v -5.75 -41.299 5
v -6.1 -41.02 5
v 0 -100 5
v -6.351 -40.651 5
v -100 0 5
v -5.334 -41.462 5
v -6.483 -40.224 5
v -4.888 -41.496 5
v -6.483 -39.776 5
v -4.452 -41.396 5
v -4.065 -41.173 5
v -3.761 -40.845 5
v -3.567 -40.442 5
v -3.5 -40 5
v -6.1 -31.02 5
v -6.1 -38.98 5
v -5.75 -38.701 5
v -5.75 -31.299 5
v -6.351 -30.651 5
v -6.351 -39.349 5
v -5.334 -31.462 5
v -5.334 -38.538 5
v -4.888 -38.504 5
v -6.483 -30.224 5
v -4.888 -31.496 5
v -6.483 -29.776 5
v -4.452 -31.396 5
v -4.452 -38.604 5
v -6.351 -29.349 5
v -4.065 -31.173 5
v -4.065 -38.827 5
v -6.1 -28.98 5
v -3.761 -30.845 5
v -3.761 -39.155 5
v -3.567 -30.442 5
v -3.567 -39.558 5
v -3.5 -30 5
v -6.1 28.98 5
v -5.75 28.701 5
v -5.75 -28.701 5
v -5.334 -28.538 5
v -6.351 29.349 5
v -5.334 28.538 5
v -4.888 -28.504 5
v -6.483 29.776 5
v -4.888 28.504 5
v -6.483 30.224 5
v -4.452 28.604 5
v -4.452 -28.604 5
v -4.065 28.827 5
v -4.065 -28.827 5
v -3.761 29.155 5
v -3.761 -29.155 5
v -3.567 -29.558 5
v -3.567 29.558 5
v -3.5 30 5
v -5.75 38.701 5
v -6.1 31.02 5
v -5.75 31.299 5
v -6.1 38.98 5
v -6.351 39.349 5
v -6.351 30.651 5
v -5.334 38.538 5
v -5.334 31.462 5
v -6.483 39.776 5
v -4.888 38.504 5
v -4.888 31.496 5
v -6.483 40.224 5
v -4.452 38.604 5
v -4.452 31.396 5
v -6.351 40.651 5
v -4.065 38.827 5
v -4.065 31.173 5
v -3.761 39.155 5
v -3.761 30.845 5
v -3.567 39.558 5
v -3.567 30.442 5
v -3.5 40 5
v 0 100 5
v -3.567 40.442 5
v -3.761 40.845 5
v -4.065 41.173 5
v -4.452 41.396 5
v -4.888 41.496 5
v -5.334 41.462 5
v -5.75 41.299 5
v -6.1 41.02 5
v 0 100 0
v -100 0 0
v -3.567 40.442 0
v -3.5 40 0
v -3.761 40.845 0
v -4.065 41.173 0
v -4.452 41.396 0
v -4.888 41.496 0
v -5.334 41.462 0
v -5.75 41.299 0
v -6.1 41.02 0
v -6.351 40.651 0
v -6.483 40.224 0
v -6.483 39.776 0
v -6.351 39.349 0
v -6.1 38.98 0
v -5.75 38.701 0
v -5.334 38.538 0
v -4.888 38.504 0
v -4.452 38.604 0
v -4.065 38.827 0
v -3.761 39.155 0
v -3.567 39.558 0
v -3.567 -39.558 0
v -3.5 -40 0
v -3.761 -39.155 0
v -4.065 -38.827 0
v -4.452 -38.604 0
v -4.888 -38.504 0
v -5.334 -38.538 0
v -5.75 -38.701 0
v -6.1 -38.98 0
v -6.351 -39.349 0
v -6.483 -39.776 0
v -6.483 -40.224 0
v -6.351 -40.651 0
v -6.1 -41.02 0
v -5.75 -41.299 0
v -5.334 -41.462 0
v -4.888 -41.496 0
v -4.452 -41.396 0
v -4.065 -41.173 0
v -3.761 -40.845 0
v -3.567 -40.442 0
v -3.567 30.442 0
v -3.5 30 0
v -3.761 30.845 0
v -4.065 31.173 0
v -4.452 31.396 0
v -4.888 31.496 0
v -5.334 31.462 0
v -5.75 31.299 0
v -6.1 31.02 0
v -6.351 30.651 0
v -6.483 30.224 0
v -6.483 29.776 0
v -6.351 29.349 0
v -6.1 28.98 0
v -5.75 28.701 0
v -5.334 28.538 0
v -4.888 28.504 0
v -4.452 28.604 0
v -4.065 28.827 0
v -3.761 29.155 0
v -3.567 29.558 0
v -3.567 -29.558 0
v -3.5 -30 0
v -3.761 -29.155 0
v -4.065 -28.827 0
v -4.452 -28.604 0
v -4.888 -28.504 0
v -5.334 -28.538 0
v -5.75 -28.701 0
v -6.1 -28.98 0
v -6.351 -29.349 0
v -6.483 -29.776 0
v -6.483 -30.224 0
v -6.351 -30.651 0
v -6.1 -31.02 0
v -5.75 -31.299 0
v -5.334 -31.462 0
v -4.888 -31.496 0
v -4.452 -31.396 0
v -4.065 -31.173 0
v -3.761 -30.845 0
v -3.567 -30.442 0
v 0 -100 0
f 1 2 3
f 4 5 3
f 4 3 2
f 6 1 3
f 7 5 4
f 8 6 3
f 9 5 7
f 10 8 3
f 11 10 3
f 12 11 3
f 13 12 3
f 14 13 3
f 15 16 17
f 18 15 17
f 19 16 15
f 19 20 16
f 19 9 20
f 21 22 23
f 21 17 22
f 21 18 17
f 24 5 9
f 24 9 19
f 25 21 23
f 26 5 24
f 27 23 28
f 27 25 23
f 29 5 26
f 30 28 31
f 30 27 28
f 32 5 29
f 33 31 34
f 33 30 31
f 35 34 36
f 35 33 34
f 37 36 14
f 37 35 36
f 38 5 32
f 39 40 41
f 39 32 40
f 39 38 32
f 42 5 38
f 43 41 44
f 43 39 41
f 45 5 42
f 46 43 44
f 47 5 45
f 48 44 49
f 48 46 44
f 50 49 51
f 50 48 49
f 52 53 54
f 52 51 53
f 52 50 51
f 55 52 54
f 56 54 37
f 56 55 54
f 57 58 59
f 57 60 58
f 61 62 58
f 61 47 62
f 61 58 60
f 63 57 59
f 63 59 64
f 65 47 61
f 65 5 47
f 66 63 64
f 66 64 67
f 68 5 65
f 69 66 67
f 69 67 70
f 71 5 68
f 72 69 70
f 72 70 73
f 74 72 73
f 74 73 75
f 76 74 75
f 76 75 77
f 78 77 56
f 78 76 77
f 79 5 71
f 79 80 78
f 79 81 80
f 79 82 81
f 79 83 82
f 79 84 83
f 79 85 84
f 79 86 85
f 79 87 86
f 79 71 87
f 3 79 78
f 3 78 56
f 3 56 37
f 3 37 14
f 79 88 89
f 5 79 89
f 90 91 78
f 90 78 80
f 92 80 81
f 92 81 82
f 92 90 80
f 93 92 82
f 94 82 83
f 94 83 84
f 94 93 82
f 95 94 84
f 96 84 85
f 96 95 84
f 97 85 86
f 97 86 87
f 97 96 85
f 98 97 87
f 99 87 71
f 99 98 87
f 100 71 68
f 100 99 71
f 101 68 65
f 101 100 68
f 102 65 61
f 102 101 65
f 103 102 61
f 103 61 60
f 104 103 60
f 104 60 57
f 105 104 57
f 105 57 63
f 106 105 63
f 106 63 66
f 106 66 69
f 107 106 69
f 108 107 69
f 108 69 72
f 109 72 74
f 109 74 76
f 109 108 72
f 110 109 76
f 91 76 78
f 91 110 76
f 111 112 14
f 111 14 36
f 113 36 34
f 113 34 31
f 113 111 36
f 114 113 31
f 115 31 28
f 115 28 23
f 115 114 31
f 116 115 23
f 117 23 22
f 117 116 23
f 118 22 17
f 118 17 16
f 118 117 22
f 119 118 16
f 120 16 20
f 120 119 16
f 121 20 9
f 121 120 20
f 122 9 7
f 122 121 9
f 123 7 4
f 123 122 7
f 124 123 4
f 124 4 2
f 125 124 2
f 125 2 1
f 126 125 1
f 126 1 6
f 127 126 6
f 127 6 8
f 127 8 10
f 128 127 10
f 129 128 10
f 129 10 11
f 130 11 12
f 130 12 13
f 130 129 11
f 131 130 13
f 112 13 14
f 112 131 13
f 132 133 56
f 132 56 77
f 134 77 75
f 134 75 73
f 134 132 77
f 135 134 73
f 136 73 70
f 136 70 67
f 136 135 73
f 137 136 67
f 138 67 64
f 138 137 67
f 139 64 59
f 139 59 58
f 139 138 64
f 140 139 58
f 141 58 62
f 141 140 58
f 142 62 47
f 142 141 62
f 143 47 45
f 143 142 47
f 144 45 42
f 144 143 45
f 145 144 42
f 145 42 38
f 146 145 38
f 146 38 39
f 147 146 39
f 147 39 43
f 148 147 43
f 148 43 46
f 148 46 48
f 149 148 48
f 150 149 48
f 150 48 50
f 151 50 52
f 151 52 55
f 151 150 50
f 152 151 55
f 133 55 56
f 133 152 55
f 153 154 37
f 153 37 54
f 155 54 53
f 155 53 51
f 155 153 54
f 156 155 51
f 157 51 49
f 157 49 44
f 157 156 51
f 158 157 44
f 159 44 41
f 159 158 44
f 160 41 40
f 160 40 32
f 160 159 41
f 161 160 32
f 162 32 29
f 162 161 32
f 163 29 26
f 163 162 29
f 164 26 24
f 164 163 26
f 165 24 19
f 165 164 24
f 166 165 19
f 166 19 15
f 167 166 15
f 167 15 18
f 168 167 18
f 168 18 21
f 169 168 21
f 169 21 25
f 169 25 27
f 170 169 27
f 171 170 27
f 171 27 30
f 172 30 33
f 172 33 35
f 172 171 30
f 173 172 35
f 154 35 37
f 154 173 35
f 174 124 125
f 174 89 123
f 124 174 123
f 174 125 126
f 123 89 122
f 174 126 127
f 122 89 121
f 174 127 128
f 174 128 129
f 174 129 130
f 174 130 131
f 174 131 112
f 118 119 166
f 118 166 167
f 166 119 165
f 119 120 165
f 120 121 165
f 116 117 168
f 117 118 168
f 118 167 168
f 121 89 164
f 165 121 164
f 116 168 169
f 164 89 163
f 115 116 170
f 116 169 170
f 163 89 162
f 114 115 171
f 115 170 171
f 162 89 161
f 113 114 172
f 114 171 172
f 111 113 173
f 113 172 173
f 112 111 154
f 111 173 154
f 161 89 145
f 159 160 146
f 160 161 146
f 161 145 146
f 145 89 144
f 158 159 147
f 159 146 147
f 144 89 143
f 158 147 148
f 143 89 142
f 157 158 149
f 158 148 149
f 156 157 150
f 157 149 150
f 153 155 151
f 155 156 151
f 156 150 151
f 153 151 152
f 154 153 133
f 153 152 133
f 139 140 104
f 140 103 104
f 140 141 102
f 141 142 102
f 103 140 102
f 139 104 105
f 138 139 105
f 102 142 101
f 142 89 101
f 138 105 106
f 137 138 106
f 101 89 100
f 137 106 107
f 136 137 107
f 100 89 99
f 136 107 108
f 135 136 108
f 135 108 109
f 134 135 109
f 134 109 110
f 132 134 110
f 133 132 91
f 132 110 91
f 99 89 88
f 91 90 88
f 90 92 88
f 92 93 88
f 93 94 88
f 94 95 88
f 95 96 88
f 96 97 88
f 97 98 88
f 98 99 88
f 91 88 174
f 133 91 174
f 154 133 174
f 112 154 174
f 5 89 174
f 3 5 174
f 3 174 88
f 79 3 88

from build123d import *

# Parameters (mm, degrees)
SKETCH2_R           = 1.5
BOSS_EXTRUDE1_DEPTH = 5


with BuildPart() as part:
    # Sketch2 → Boss-Extrude1 (new body)
    with BuildSketch(Plane.XY):
        Polygon((0, -100), (0, 100), (-100, 0), align=None)
        with Locations((-5, 40)):
            Circle(SKETCH2_R, mode=Mode.SUBTRACT)
        with Locations((-5, 30)):
            Circle(SKETCH2_R, mode=Mode.SUBTRACT)
        with Locations((-5, -30)):
            Circle(SKETCH2_R, mode=Mode.SUBTRACT)
        with Locations((-5, -40)):
            Circle(SKETCH2_R, mode=Mode.SUBTRACT)
    extrude(amount=BOSS_EXTRUDE1_DEPTH)


solid = part.part
